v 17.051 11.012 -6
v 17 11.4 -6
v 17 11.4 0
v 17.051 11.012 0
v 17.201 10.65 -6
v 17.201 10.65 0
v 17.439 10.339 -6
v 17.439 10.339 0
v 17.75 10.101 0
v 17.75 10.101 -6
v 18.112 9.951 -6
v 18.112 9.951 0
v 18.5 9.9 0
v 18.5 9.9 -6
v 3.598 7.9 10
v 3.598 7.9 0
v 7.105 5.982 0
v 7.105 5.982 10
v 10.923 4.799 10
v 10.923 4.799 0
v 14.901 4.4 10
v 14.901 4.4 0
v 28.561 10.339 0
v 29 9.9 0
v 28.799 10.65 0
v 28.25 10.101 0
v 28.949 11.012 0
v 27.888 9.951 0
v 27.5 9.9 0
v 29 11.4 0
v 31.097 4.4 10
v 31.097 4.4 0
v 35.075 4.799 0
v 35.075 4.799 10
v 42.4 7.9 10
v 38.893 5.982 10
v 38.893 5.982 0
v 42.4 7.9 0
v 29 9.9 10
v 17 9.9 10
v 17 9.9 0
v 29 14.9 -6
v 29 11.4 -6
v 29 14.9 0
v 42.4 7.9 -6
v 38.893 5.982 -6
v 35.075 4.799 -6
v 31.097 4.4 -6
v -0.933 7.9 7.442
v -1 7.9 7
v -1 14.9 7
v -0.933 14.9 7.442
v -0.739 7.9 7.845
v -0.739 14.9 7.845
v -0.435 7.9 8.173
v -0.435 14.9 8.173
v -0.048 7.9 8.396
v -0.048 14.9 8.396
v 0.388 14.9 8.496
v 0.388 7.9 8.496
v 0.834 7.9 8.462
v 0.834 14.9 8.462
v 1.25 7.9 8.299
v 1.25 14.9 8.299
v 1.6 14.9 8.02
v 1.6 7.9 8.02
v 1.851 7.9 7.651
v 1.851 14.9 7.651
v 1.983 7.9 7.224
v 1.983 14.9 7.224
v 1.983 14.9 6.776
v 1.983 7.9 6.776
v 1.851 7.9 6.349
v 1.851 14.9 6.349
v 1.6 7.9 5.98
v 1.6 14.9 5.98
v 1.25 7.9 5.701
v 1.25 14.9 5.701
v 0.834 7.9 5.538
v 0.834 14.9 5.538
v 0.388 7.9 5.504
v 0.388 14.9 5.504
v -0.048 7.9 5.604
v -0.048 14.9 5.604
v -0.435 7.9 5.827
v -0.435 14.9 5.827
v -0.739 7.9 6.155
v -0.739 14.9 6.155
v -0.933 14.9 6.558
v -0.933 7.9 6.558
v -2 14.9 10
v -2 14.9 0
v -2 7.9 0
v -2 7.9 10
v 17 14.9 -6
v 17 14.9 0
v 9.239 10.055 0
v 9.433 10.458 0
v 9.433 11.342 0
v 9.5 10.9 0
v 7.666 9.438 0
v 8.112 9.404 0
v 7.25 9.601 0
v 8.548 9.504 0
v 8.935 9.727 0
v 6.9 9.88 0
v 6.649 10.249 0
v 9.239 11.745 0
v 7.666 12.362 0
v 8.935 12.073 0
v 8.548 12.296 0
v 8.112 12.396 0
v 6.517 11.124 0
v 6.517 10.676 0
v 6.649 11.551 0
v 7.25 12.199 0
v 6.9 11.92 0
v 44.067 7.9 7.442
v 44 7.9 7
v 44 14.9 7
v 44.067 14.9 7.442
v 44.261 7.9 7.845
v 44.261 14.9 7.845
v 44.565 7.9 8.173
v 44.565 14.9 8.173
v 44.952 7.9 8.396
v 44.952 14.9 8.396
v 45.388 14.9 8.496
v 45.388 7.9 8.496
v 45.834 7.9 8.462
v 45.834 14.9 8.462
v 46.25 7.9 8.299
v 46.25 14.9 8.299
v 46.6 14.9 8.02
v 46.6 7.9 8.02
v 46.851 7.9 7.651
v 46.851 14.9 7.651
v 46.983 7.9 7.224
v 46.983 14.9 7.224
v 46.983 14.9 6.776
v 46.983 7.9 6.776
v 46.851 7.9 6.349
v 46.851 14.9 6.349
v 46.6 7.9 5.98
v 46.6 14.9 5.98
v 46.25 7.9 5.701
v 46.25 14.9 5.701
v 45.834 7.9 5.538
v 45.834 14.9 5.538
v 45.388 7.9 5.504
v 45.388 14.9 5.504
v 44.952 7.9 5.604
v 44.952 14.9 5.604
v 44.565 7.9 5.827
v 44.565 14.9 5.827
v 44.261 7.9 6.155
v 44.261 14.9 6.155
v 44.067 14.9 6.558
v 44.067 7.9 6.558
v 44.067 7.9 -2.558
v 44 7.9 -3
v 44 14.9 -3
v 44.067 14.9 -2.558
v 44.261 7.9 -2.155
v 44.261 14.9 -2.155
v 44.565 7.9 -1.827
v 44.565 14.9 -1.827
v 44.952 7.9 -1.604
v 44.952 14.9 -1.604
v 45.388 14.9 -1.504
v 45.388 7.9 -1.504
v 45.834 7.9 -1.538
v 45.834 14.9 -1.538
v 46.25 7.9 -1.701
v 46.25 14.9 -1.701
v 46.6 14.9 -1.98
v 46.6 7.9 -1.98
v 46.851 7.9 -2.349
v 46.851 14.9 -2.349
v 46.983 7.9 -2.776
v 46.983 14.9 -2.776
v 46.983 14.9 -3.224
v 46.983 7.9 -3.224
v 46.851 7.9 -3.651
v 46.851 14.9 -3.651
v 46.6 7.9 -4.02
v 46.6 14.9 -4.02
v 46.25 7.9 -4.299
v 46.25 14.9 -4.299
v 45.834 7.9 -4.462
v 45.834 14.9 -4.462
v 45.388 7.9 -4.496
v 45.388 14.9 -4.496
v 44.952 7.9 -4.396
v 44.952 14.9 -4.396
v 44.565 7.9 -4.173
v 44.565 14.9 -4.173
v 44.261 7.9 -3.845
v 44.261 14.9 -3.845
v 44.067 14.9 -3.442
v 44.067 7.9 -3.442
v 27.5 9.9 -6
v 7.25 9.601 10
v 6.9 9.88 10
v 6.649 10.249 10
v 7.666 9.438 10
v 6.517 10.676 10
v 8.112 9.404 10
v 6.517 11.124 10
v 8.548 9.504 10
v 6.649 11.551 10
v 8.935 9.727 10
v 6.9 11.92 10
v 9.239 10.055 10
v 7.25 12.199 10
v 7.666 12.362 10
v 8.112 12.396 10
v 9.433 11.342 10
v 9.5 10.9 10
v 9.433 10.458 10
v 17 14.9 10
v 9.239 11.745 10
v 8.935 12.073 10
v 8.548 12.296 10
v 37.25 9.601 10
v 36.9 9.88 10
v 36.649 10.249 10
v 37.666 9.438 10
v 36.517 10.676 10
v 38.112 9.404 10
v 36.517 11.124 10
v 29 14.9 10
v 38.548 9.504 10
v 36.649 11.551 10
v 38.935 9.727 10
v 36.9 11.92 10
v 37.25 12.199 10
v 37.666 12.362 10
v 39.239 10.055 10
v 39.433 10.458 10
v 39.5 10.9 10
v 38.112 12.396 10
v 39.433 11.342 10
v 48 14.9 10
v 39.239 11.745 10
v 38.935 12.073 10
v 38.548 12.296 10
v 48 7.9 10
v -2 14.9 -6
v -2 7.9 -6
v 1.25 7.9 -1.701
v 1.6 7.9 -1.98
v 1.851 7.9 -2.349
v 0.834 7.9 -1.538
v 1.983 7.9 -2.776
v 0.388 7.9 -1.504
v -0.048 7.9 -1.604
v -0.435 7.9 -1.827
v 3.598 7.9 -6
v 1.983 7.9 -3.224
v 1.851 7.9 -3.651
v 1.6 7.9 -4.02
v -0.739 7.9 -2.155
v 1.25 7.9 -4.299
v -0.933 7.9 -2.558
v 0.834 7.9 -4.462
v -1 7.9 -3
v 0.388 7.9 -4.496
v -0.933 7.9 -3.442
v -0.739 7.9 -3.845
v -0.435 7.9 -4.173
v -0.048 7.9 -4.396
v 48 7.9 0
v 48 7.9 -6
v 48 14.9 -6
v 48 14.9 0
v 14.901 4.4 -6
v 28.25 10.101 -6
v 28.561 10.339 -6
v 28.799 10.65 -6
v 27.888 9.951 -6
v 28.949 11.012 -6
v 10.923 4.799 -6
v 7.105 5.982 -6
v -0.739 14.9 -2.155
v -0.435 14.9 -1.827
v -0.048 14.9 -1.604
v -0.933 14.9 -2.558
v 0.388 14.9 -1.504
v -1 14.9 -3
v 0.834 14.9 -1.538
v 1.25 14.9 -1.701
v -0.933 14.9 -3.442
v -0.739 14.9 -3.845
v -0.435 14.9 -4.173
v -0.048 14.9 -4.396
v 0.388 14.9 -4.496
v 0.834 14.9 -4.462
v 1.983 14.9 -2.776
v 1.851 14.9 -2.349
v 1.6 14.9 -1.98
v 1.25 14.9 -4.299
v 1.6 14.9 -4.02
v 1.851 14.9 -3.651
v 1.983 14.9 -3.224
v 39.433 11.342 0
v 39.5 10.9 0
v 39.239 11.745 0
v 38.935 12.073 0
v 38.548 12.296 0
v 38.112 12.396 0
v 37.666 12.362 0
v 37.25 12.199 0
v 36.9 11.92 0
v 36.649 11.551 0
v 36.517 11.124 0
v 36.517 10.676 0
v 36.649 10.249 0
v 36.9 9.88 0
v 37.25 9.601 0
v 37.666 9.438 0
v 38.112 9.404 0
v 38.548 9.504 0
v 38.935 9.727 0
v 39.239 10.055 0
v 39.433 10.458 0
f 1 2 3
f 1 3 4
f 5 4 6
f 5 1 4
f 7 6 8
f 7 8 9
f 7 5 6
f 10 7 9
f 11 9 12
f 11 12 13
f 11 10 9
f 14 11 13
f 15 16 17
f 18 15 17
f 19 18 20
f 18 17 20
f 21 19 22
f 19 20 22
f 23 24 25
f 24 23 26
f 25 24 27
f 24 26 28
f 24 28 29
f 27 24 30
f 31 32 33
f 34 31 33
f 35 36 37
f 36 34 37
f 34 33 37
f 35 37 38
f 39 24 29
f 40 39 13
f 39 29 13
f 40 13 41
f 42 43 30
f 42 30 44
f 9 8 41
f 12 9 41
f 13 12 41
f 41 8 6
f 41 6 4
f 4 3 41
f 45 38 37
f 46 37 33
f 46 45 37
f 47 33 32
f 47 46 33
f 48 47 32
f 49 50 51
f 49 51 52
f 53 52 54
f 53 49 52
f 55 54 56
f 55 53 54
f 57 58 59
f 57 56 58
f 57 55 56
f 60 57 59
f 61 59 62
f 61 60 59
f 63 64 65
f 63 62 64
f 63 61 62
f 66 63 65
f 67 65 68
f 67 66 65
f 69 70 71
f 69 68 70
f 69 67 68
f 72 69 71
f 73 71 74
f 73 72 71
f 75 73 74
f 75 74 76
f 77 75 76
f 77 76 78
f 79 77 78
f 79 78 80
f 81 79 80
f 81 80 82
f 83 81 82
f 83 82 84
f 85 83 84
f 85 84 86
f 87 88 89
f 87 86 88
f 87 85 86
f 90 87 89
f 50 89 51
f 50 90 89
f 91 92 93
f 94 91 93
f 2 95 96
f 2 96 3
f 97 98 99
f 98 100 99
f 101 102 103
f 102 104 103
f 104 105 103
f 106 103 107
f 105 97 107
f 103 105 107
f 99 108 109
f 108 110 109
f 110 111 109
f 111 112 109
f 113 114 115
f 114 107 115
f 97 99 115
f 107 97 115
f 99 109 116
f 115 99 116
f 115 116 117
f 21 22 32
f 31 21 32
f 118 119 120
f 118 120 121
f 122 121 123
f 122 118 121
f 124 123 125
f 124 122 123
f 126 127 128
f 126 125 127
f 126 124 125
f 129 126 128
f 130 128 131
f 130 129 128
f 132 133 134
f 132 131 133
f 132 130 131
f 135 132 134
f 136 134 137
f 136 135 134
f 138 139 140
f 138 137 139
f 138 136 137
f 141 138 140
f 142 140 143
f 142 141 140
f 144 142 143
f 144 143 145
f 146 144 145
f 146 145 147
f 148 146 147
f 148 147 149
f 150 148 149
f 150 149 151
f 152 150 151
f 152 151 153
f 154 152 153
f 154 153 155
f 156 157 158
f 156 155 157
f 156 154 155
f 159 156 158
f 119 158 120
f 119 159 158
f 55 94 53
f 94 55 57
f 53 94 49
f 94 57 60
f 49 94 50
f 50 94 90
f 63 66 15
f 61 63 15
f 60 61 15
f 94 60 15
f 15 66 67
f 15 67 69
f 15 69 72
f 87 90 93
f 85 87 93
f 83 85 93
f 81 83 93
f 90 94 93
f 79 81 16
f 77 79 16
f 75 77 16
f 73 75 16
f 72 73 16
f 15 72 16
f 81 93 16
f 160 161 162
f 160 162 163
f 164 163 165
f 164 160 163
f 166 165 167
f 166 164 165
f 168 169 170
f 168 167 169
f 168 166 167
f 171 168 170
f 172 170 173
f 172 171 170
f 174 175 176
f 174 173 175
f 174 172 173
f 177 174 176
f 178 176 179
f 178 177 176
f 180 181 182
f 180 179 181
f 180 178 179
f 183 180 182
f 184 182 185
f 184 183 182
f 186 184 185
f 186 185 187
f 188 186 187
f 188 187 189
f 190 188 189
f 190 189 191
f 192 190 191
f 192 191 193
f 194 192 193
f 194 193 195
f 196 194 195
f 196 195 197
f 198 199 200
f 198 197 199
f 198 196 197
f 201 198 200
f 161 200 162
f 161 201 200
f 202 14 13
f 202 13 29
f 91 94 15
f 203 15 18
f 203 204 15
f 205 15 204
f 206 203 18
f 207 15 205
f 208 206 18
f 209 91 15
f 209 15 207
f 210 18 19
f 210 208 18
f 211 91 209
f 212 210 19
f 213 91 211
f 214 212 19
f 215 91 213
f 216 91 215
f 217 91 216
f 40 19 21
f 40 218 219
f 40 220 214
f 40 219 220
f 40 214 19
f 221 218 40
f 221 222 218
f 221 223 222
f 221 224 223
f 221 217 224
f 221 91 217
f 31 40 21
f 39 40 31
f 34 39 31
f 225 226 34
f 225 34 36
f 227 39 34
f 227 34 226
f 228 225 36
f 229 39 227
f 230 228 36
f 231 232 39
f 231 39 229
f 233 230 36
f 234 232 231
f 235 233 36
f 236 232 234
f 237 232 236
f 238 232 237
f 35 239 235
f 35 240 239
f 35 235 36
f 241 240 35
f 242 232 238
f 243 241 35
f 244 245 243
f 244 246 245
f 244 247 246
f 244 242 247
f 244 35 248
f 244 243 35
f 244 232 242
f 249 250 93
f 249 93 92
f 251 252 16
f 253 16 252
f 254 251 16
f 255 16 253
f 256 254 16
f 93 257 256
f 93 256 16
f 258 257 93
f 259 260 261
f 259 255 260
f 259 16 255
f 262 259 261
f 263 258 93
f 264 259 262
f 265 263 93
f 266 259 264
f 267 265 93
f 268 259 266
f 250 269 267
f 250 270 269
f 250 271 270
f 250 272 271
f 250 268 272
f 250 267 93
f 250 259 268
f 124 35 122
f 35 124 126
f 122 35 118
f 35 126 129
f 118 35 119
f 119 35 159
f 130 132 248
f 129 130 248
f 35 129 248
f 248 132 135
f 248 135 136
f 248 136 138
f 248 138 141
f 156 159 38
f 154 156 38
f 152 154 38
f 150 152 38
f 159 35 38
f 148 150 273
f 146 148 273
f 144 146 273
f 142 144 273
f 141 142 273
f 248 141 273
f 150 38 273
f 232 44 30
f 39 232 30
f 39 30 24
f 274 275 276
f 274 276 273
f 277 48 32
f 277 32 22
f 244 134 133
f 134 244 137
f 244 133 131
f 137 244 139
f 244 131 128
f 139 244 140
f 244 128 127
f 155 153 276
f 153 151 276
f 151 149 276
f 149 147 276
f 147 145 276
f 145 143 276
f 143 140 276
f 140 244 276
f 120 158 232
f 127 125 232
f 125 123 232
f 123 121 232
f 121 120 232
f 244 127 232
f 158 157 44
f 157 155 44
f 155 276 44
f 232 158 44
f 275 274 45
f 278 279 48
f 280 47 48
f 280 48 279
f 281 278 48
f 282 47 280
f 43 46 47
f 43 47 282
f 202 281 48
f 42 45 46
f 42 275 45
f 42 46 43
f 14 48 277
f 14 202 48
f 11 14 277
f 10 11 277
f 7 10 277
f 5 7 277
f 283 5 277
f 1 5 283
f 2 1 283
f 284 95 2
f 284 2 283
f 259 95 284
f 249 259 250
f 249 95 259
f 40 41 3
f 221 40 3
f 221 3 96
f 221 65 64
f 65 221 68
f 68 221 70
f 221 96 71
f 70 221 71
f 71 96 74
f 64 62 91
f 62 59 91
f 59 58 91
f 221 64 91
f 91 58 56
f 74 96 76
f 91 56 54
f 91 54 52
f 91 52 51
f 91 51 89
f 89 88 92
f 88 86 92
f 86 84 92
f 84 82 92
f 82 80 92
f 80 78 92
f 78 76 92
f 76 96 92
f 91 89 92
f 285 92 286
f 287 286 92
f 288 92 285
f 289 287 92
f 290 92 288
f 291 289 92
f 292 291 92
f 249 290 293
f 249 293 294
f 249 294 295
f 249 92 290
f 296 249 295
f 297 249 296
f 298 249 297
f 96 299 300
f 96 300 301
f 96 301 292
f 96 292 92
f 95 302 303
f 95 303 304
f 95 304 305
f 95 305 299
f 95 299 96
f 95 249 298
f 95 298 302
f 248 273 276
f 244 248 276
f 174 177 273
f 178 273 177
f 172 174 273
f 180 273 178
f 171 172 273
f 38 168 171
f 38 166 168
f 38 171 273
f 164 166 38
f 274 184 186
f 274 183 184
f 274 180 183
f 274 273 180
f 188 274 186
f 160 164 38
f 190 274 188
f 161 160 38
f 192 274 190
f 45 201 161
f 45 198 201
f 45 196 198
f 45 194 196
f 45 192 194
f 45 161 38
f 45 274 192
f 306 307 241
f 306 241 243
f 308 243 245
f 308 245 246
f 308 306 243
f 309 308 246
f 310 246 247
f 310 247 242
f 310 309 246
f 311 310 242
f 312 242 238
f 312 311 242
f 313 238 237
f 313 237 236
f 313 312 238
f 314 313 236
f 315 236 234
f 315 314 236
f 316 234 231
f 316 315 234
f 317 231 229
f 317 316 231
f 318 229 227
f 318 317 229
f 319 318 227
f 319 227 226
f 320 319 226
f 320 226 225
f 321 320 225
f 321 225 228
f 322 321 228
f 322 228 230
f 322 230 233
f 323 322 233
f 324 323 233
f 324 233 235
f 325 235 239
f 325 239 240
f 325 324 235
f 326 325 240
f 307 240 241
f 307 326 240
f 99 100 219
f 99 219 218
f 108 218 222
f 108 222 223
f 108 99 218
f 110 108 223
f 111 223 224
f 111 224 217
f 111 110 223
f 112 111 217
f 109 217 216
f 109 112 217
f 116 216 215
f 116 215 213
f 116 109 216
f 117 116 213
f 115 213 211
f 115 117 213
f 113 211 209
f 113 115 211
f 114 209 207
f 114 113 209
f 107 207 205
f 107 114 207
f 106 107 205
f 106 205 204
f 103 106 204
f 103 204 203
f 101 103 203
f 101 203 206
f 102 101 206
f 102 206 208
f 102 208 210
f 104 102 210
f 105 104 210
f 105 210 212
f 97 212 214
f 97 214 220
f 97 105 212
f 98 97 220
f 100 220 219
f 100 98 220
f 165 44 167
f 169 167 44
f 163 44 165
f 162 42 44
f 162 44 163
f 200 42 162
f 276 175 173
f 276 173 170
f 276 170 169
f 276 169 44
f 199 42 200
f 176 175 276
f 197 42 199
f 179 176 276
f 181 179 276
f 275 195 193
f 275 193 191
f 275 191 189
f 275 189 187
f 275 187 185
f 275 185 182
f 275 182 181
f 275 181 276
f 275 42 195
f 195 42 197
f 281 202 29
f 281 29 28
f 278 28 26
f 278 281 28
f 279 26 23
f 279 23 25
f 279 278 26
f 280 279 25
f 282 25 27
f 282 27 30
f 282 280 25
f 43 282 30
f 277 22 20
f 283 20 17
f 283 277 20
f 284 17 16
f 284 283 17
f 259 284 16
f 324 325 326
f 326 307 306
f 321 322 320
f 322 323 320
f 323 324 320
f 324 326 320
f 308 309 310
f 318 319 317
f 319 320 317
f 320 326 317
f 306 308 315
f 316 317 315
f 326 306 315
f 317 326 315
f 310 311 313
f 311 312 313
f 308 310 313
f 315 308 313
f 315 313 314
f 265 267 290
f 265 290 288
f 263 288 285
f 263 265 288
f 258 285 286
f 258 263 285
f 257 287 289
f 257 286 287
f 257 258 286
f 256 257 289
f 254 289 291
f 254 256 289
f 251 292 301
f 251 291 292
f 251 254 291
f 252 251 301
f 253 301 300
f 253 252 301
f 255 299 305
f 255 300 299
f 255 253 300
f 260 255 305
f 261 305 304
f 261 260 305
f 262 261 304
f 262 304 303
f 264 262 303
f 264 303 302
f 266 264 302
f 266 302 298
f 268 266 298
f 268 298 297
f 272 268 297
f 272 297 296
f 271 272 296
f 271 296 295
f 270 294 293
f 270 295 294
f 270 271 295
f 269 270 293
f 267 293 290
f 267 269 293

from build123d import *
from build123d.topology import SkipClean

# Parameters (mm, degrees)
SKETCH7_R               = 1.5
BOSS_EXTRUDE11_DEPTH    = 10
FILLET1_R               = 20
BOSS_EXTRUDE12_START    = 6
BOSS_EXTRUDE12_DEPTH    = 6
CUT_EXTRUDE1_DEPTH      = 51.142297514
CUT_EXTRUDE1_DEPTH_BACK = 51.142297514
SKETCH10_R              = 1.5


with BuildPart() as part:
    # Sketch7 → Boss-Extrude11 (new body)
    with BuildSketch(Plane.XY):
        Polygon((11, 14.9), (-2, 14.9), (-2, 7.9), (3.598076211, 7.9), (3.598076211, 4.4), (42.4, 4.4), (42.4, 7.9), (48, 7.9), (48, 14.9), (35, 14.9), (29, 14.9), (29, 9.9), (17, 9.9), (17, 14.9), align=None)
        with Locations((8, 10.9)):
            Circle(SKETCH7_R, mode=Mode.SUBTRACT)
        with Locations((38, 10.9)):
            Circle(SKETCH7_R, mode=Mode.SUBTRACT)
    extrude(amount=BOSS_EXTRUDE11_DEPTH)

    # Fillet1
    # the kernel refuses this fillet: 20 mm, written as the material it takes off along each edge
    with BuildSketch(Plane(origin=(42.4, 4.4, -28.256636389), x_dir=(-1.4210854715172548e-12, 1.0, 0), z_dir=(0, 0, 1))) as fillet1_piece_1:
        with BuildLine():
            CenterArc((20, 11.302654555), FILLET1_R, 180, 34.41150867)
            Line((0, 11.302654555), (-0.4, 11.302654555))
            Line((-0.4, 11.302654555), (-0.4, 0))
            Line((-0.4, 0), (0, -0.4))
            ThreePointArc((0, -0.4), (1.75, -0.4), (3.17, -0.226053091))
            Line((3.17, -0.226053091), (3.5, 0))
        make_face()
    extrude(amount=66.513272777, mode=Mode.SUBTRACT)
    with BuildSketch(Plane(origin=(3.598076211, 4.4, -28.256636389), x_dir=(1, 0, 0), z_dir=(0, 0, 1))) as fillet1_piece_2:
        with BuildLine():
            CenterArc((11.302654555, 20), FILLET1_R, 235.58849133, 34.41150867)
            Line((0, 3.5), (-0.226053091, 3.17))
            ThreePointArc((-0.226053091, 3.17), (-0.4, 1.75), (-0.4, 0))
            Line((-0.4, 0), (0, -0.4))
            Line((0, -0.4), (11.302654555, -0.4))
            Line((11.302654555, -0.4), (11.302654555, 0))
        make_face()
    extrude(amount=66.513272777, mode=Mode.SUBTRACT)

    # Sketch9 → Boss-Extrude12 (add)
    with SkipClean():  # the faces are left unmerged after this step: merging them gives an invalid solid
        with BuildSketch(Plane(origin=(0, 0, 0), x_dir=(-1, 0, 0), z_dir=(0, 0, -1)).offset(BOSS_EXTRUDE12_START)):
            with BuildLine():
                Line((-48, 7.9), (-42.4, 7.9))
                ThreePointArc((-42.4, 7.9), (-37.013425228, 5.295026825), (-31.097345445, 4.4))
                Line((-31.097345445, 4.4), (-14.900730767, 4.4))
                ThreePointArc((-14.900730767, 4.4), (-8.984650984, 5.295026825), (-3.598076211, 7.9))
                Line((-3.598076211, 7.9), (2, 7.9))
                Line((2, 7.9), (2, 14.9))
                Line((2, 14.9), (-17, 14.9))
                Line((-17, 14.9), (-17, 11.4))
                ThreePointArc((-17, 11.4), (-17.439339828, 10.339339828), (-18.5, 9.9))
                Line((-18.5, 9.9), (-27.5, 9.9))
                ThreePointArc((-27.5, 9.9), (-28.560660172, 10.339339828), (-29, 11.4))
                Line((-29, 11.4), (-29, 14.9))
                Line((-29, 14.9), (-48, 14.9))
                Line((-48, 14.9), (-48, 7.9))
            make_face()
        extrude(amount=-BOSS_EXTRUDE12_DEPTH)

    # Sketch10 → Cut-Extrude1 (cut, two sides: drawn at the far end of the back side and taken through both)
    with SkipClean():  # the faces are left unmerged after this step: merging them gives an invalid solid
        with BuildSketch(Plane(origin=(0, 14.9, 0), x_dir=(1, 0, 0), z_dir=(0, 1, 0)).offset(-CUT_EXTRUDE1_DEPTH_BACK)):
            with Locations(Location((0.5, -7, 0), (0, 0, 180))):
                Circle(SKETCH10_R)
            with Locations(Location((0.5, 3, 0), (0, 0, 180))):
                Circle(SKETCH10_R)
            with Locations(Location((45.5, -7, 0), (0, 0, 180))):
                Circle(SKETCH10_R)
            with Locations(Location((45.5, 3, 0), (0, 0, 180))):
                Circle(SKETCH10_R)
        extrude(amount=CUT_EXTRUDE1_DEPTH + CUT_EXTRUDE1_DEPTH_BACK, mode=Mode.SUBTRACT)


solid = part.part
